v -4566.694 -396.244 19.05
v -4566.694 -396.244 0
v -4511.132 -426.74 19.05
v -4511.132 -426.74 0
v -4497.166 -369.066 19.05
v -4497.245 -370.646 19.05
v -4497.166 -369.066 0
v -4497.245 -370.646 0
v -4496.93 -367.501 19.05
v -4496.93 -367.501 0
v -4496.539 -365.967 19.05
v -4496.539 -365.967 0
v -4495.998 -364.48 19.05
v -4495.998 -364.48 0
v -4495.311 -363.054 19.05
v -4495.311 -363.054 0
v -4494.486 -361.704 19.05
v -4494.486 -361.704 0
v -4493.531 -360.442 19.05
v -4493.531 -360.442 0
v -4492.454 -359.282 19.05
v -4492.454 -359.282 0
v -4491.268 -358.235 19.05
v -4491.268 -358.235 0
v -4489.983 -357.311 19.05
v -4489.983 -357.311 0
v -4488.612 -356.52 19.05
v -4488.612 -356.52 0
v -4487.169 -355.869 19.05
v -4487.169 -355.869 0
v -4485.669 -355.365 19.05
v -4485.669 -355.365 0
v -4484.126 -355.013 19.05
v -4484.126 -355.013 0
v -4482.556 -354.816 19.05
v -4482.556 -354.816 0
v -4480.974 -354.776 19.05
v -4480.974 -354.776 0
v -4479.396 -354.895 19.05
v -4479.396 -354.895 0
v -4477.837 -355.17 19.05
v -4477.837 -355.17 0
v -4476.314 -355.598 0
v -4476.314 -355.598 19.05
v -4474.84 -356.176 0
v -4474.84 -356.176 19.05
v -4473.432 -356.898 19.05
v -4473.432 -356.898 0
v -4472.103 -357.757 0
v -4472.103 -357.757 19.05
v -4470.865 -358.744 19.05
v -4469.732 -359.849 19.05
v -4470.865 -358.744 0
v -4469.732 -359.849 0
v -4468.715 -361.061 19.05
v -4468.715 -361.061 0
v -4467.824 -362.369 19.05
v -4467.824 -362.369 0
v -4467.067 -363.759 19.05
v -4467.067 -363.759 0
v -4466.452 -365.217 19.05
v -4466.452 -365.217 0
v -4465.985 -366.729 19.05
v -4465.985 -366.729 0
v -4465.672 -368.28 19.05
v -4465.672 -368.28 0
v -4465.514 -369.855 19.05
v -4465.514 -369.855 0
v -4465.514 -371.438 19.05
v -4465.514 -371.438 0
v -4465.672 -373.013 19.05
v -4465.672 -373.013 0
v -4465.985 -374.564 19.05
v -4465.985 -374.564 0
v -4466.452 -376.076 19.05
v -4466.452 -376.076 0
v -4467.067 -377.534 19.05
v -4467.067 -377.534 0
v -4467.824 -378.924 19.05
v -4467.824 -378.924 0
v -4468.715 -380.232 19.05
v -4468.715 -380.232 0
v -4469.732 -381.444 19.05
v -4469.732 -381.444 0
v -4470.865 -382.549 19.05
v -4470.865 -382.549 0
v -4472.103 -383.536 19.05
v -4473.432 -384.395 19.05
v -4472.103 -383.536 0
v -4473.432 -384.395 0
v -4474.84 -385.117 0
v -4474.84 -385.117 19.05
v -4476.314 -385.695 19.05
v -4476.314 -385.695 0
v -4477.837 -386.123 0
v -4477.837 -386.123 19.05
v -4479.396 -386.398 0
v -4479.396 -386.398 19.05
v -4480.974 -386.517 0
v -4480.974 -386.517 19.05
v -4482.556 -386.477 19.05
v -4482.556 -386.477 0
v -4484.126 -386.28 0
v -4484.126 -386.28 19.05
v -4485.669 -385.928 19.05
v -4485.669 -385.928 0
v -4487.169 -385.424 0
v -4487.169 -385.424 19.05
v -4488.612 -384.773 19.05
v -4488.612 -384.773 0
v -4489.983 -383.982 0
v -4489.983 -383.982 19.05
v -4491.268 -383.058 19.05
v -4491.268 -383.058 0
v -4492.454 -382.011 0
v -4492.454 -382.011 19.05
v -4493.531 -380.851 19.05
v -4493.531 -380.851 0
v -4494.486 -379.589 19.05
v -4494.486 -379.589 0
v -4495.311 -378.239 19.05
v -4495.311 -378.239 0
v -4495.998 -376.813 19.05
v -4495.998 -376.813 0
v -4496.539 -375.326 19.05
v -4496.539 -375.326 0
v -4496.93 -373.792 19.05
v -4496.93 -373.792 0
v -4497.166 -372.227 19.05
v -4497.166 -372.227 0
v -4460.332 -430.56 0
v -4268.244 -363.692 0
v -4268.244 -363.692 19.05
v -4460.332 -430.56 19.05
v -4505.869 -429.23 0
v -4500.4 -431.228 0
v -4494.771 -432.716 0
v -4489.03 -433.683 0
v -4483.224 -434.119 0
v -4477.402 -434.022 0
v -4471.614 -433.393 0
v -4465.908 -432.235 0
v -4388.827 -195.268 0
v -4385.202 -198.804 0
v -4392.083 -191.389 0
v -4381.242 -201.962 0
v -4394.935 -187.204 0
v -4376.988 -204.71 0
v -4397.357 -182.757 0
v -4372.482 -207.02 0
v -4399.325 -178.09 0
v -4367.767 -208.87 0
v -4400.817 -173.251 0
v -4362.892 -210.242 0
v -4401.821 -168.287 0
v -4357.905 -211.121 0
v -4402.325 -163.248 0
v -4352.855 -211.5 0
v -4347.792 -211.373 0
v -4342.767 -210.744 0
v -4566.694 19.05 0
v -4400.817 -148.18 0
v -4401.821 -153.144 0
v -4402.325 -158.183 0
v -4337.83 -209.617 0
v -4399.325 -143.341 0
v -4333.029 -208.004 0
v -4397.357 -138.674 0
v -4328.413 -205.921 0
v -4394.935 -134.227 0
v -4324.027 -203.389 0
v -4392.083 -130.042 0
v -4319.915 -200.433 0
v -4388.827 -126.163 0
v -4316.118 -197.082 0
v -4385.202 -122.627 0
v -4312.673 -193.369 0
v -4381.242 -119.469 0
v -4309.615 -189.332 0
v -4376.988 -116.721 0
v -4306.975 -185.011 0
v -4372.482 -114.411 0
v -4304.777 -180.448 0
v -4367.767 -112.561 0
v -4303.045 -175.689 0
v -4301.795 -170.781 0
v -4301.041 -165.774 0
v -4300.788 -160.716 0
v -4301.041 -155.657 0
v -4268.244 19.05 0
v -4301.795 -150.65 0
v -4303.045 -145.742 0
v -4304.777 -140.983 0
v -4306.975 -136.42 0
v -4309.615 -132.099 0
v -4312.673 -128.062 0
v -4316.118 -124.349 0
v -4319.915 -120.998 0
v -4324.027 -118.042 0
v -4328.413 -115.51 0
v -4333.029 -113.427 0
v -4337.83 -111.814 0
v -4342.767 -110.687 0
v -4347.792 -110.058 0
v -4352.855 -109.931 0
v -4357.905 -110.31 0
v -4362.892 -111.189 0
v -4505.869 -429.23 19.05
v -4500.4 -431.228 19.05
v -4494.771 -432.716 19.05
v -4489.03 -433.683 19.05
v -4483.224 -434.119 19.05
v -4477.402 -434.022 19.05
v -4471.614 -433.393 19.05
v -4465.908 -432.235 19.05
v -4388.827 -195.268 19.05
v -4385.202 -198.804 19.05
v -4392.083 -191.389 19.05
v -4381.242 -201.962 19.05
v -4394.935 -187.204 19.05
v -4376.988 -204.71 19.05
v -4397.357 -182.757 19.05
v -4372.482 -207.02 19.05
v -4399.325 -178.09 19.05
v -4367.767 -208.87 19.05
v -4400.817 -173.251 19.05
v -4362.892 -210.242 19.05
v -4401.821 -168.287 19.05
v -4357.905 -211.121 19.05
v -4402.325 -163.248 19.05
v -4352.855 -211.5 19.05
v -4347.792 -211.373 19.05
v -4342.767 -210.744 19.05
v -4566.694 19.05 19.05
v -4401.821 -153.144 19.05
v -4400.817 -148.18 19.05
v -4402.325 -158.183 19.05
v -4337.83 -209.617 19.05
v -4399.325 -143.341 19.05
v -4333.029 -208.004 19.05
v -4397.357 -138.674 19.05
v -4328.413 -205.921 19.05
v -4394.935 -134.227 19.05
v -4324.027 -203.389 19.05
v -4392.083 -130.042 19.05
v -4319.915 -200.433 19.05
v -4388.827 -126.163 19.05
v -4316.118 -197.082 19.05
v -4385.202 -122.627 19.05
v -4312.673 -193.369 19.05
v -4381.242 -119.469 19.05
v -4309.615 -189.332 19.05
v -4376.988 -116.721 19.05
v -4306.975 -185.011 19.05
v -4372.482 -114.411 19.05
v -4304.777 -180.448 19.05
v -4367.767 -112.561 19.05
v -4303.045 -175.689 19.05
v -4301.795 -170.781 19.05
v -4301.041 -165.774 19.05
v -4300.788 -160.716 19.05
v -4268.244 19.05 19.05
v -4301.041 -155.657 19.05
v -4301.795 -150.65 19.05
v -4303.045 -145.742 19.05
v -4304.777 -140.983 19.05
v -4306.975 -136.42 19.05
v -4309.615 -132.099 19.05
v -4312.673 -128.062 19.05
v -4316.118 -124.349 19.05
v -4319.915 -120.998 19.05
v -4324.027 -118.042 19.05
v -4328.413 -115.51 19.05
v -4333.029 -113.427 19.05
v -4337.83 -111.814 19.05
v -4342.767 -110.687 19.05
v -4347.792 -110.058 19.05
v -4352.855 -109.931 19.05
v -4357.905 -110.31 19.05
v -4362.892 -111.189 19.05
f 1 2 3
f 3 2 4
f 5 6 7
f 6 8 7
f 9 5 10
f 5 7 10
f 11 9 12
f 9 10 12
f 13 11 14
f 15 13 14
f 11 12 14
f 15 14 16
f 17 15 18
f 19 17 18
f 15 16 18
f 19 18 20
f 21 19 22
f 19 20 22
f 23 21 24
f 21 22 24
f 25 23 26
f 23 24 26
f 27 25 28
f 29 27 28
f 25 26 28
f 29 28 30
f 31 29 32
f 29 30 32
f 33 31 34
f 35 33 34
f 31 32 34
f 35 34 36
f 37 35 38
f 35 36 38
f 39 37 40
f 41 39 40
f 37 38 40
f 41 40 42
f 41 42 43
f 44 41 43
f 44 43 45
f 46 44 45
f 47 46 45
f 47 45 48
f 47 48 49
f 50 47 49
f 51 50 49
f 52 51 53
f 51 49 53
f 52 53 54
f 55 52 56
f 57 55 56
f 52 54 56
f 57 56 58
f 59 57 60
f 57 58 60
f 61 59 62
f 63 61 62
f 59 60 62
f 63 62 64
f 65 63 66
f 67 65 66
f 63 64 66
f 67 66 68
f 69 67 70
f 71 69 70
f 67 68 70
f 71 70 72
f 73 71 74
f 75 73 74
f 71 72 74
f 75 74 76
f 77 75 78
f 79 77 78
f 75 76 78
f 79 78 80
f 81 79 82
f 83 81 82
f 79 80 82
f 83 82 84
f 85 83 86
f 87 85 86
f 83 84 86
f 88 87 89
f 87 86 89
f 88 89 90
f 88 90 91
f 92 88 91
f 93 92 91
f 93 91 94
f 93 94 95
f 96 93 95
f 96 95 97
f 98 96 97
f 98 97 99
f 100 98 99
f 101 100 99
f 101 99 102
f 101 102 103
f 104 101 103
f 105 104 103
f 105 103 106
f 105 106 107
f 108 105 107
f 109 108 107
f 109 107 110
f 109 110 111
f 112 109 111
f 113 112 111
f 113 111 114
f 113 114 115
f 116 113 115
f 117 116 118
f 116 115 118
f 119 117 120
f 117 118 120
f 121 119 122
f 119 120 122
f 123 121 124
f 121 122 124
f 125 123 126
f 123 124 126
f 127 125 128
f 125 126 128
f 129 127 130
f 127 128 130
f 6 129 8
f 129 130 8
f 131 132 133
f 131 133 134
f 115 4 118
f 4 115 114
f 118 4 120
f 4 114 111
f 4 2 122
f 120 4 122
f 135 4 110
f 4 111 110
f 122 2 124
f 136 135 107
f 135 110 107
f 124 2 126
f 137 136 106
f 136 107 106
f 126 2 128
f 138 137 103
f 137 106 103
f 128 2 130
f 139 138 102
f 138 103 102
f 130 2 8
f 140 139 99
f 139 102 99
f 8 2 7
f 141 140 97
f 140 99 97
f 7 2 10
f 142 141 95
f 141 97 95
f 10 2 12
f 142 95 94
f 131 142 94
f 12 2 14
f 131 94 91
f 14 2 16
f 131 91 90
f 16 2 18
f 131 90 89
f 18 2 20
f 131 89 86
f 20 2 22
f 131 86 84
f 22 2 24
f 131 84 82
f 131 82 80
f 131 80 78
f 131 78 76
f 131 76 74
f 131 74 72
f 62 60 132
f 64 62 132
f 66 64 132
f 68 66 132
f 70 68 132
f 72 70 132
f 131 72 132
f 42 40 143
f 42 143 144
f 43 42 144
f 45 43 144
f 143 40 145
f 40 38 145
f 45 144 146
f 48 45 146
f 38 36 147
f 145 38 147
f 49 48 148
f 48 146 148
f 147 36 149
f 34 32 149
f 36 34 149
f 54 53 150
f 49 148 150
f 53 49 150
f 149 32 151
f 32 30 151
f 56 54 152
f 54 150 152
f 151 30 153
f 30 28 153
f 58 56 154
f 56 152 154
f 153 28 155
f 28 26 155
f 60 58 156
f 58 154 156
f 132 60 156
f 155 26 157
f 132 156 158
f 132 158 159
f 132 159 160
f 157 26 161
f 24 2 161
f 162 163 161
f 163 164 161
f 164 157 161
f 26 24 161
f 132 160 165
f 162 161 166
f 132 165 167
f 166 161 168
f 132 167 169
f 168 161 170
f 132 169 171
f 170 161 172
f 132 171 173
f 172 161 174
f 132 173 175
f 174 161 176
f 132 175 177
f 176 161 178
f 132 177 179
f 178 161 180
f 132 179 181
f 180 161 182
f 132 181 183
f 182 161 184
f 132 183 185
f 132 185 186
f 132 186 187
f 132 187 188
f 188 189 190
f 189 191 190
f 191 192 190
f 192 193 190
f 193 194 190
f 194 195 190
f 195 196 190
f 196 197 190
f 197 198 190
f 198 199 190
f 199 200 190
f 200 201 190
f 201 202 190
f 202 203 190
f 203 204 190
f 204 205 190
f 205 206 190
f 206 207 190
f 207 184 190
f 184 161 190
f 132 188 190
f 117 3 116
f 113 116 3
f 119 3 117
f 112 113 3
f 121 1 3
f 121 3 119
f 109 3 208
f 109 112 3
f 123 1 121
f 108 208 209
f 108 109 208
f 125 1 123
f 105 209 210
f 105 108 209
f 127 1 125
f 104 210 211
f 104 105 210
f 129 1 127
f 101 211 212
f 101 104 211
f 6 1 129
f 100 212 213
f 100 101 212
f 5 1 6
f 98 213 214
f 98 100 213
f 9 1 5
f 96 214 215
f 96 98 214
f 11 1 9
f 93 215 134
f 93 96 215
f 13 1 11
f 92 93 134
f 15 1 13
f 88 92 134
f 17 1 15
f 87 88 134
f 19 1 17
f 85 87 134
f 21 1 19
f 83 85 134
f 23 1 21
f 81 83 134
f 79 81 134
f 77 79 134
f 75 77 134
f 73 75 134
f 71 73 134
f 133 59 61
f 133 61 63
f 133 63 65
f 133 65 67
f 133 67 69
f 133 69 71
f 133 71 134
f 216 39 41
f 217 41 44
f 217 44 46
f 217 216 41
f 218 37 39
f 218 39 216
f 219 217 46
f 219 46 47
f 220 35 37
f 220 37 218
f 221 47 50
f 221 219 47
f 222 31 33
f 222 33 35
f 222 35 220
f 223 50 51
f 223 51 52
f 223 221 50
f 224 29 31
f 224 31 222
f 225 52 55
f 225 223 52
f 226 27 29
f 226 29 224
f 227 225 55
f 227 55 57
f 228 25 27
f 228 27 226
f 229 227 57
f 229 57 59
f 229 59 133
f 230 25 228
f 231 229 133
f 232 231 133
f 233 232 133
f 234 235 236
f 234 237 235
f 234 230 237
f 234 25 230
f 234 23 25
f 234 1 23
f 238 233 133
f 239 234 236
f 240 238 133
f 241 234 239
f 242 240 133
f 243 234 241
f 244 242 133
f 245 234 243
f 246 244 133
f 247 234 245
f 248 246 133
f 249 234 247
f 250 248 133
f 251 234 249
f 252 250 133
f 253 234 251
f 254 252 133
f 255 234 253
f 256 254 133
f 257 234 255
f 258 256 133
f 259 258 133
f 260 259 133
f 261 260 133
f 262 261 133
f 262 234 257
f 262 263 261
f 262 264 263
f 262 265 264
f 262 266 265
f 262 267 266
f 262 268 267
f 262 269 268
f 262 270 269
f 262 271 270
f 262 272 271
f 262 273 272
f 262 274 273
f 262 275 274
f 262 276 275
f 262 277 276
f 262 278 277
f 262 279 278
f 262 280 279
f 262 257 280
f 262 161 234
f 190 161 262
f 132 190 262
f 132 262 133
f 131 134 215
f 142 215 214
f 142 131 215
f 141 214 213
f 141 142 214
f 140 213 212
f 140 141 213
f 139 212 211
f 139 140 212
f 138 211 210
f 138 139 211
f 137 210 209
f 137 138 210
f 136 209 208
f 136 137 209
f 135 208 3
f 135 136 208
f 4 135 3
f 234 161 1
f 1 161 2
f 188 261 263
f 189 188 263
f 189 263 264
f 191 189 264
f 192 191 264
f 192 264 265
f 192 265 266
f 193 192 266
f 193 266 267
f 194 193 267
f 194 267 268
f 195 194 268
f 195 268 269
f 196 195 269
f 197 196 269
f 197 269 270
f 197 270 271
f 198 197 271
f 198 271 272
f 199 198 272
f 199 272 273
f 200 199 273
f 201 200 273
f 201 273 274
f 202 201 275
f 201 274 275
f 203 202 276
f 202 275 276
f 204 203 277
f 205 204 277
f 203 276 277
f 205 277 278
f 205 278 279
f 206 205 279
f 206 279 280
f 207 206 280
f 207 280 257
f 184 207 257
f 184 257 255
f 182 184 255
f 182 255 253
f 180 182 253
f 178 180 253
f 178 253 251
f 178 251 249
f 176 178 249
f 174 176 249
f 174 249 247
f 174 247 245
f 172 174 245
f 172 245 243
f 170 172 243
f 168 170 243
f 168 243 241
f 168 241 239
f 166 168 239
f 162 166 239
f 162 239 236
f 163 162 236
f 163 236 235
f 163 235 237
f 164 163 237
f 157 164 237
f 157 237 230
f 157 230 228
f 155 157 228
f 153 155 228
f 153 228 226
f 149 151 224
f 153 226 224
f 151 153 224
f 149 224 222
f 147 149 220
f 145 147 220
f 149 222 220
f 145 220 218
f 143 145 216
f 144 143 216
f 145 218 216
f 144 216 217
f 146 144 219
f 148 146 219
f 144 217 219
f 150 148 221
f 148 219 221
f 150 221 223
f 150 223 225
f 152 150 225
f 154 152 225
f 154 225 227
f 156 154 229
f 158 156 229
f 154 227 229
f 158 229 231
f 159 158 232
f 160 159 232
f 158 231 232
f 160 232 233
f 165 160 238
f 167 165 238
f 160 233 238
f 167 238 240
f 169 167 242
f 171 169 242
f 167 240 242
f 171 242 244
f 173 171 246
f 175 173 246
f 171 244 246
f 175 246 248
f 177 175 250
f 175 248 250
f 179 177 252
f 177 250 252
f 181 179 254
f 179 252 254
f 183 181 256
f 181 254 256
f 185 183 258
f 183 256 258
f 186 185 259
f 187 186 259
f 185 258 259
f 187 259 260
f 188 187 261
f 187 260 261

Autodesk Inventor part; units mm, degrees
ref_plane "YZ Plane" through (0, 0, 0) normal (1, 0, 0) x (0, 1, 0)
ref_plane "XZ Plane" through (0, 0, 0) normal (0, 1, 0) x (-1, 0, 0)
ref_plane "Work Plane1" through (-4668.2945, 0, 0) normal (0, 0, 1) x (1, 0, 0)
sketch "Sketch1" plane through (-4668.2945, 0, 0) normal (0, 0, 1) x (1, 0, 0)
  line L0 (0, 19.05) -> (466.725, 19.05) projected
  line L1 (466.725, 0) -> (466.725, 19.05) projected
  line L2 (0, 0) -> (0, 19.05) projected
  line L3 (0, -340.481) -> (0, -321.431) projected
  line L4 (466.725, -340.481) -> (0, -340.481) projected
  line L5 (466.725, -340.481) -> (0, -340.481) projected
  line L6 (466.725, -340.481) -> (466.725, -321.431) projected
  line L7 (0, -321.431) -> (466.725, -321.431) construction
  line L8 (0, -340.481) -> (0, -321.431) projected
  line L9 (466.725, 19.05) -> (0, 19.05)
  line L10 (0, 19.05) -> (0, -340.481) construction
  line L11 (466.725, -340.481) -> (466.725, 19.05) construction
  line L12 (147.3639, -408.7465) -> (46.3111, -408.7465) construction
  line L13 (466.725, -340.481) -> (466.725, -408.7465) construction
  line L14 (466.725, -408.7465) -> (147.3639, -408.7465) construction
  line L15 (46.3111, -408.7465) -> (0, -408.7465)
  line L16 (0, -408.7465) -> (0, -340.481) construction
  line L17 (466.725, -408.7465) -> (466.725, -434.1465)
  line L18 (466.725, -434.1465) -> (0, -434.1465)
  line L19 (0, -434.1465) -> (0, -408.7465)
  line L20 (400.05, 19.05) -> (400.05, 0)
  line L21 (400.05, -321.431) -> (400.05, -340.481)
  line L22 (400.05, 0) -> (400.05, -321.431)
  line L23 (400.05, -340.481) -> (400.05, -434.1465)
  line L24 (101.6, 19.05) -> (101.6, 0)
  line L25 (101.6, -321.431) -> (101.6, -340.481)
  line L26 (101.6, 0) -> (101.6, -321.431)
  line L27 (101.6, -340.481) -> (101.6, -434.1465)
  point P0 (4668.2945, 0)
  point P1 (50.8, 19.05)
  point P2 (50.8, -321.431)
  point P3 (50.8, -340.481)
  point P4 (50.8, -434.1465)
  dimension "d7" = 25.4
extrude "Extrusion1" add sketch "Sketch1" along normal blind 19.05
sketch "Sketch2" plane through (-4668.2945, 0, 0) normal (0, 0, -1) x (-1, 0, 0)
  line L0 (-232.5687, -355.978) -> (-232.5688, 34.547)
  line L1 (-141.2875, -408.7465) -> (-141.2875, 124.6535)
  circle A0 centre (-186.9249, -370.6465) radius 15.875
  line L2 (-232.5687, -370.6465) -> (-141.2875, -370.6465) construction
  line L3 (0, -408.7465) -> (-466.725, -408.7465) projected
  point P0 (-4668.2945, 0)
  dimension "d2" = 31.75
  dimension "d3" = 45.6438
  dimension "d4" = 38.1
extrude "Extrusion2" cut sketch "Sketch2" against normal up to next
sketch "Sketch3" plane through (-4668.2945, 0, 0) normal (0, 0, -1) x (-1, 0, 0)
  circle A0 centre (-186.9249, -370.6465) radius 15.875 projected
  arc A1 (-207.9625, -430.5603) -> (-155.5881, -425.8756) centre (-186.9249, -370.6465) ccw
  line L0 (-101.6, -434.1465) -> (-400.05, -434.1465) projected
  line L1 (0, -340.481) -> (-157.1625, -426.7397)
  line L2 (-466.725, -340.481) -> (-207.9625, -430.5603)
  line L3 (-466.725, -434.1465) -> (-466.725, -340.481)
  line L4 (-466.725, -434.1465) -> (-466.725, 19.05) projected
  line L5 (-101.6, -434.1465) -> (-400.05, -434.1465) projected
  line L6 (0, -434.1465) -> (0, -340.481)
  line L7 (0, 19.05) -> (0, -434.1465) projected
  arc A2 (-155.5881, -425.8756) -> (-207.9625, -430.5603) centre (-186.9249, -370.6465) ccw construction
  line L8 (-101.6, 19.05) -> (-101.6, -434.1465) projected
  line L9 (-101.6, -396.2442) -> (-101.6, -434.1465)
  line L10 (-400.05, -434.1465) -> (-400.05, 19.05) projected
  line L11 (-400.05, -363.6916) -> (-400.05, -434.1465)
  point P0 (-4668.2945, 0)
  point P1 (-186.9249, -434.1465)
  point P2 (-50.8, -434.1465)
extrude "Extrusion3" cut sketch "Sketch3" against normal blind 19.05
sketch "Sketch4" plane through (-4668.2945, 0, 19.05) normal (0, 0, 1) x (1, 0, 0)
  circle A0 centre (316.7063, -160.7155) radius 12.7 construction
  circle A1 centre (316.7063, -160.7155) radius 50.8
  point P0 (4668.2945, 0)
  dimension "d10" = 101.6
extrude "Extrusion4" cut sketch "Sketch4" against normal up to next
properties part number "cannonSideWall"
